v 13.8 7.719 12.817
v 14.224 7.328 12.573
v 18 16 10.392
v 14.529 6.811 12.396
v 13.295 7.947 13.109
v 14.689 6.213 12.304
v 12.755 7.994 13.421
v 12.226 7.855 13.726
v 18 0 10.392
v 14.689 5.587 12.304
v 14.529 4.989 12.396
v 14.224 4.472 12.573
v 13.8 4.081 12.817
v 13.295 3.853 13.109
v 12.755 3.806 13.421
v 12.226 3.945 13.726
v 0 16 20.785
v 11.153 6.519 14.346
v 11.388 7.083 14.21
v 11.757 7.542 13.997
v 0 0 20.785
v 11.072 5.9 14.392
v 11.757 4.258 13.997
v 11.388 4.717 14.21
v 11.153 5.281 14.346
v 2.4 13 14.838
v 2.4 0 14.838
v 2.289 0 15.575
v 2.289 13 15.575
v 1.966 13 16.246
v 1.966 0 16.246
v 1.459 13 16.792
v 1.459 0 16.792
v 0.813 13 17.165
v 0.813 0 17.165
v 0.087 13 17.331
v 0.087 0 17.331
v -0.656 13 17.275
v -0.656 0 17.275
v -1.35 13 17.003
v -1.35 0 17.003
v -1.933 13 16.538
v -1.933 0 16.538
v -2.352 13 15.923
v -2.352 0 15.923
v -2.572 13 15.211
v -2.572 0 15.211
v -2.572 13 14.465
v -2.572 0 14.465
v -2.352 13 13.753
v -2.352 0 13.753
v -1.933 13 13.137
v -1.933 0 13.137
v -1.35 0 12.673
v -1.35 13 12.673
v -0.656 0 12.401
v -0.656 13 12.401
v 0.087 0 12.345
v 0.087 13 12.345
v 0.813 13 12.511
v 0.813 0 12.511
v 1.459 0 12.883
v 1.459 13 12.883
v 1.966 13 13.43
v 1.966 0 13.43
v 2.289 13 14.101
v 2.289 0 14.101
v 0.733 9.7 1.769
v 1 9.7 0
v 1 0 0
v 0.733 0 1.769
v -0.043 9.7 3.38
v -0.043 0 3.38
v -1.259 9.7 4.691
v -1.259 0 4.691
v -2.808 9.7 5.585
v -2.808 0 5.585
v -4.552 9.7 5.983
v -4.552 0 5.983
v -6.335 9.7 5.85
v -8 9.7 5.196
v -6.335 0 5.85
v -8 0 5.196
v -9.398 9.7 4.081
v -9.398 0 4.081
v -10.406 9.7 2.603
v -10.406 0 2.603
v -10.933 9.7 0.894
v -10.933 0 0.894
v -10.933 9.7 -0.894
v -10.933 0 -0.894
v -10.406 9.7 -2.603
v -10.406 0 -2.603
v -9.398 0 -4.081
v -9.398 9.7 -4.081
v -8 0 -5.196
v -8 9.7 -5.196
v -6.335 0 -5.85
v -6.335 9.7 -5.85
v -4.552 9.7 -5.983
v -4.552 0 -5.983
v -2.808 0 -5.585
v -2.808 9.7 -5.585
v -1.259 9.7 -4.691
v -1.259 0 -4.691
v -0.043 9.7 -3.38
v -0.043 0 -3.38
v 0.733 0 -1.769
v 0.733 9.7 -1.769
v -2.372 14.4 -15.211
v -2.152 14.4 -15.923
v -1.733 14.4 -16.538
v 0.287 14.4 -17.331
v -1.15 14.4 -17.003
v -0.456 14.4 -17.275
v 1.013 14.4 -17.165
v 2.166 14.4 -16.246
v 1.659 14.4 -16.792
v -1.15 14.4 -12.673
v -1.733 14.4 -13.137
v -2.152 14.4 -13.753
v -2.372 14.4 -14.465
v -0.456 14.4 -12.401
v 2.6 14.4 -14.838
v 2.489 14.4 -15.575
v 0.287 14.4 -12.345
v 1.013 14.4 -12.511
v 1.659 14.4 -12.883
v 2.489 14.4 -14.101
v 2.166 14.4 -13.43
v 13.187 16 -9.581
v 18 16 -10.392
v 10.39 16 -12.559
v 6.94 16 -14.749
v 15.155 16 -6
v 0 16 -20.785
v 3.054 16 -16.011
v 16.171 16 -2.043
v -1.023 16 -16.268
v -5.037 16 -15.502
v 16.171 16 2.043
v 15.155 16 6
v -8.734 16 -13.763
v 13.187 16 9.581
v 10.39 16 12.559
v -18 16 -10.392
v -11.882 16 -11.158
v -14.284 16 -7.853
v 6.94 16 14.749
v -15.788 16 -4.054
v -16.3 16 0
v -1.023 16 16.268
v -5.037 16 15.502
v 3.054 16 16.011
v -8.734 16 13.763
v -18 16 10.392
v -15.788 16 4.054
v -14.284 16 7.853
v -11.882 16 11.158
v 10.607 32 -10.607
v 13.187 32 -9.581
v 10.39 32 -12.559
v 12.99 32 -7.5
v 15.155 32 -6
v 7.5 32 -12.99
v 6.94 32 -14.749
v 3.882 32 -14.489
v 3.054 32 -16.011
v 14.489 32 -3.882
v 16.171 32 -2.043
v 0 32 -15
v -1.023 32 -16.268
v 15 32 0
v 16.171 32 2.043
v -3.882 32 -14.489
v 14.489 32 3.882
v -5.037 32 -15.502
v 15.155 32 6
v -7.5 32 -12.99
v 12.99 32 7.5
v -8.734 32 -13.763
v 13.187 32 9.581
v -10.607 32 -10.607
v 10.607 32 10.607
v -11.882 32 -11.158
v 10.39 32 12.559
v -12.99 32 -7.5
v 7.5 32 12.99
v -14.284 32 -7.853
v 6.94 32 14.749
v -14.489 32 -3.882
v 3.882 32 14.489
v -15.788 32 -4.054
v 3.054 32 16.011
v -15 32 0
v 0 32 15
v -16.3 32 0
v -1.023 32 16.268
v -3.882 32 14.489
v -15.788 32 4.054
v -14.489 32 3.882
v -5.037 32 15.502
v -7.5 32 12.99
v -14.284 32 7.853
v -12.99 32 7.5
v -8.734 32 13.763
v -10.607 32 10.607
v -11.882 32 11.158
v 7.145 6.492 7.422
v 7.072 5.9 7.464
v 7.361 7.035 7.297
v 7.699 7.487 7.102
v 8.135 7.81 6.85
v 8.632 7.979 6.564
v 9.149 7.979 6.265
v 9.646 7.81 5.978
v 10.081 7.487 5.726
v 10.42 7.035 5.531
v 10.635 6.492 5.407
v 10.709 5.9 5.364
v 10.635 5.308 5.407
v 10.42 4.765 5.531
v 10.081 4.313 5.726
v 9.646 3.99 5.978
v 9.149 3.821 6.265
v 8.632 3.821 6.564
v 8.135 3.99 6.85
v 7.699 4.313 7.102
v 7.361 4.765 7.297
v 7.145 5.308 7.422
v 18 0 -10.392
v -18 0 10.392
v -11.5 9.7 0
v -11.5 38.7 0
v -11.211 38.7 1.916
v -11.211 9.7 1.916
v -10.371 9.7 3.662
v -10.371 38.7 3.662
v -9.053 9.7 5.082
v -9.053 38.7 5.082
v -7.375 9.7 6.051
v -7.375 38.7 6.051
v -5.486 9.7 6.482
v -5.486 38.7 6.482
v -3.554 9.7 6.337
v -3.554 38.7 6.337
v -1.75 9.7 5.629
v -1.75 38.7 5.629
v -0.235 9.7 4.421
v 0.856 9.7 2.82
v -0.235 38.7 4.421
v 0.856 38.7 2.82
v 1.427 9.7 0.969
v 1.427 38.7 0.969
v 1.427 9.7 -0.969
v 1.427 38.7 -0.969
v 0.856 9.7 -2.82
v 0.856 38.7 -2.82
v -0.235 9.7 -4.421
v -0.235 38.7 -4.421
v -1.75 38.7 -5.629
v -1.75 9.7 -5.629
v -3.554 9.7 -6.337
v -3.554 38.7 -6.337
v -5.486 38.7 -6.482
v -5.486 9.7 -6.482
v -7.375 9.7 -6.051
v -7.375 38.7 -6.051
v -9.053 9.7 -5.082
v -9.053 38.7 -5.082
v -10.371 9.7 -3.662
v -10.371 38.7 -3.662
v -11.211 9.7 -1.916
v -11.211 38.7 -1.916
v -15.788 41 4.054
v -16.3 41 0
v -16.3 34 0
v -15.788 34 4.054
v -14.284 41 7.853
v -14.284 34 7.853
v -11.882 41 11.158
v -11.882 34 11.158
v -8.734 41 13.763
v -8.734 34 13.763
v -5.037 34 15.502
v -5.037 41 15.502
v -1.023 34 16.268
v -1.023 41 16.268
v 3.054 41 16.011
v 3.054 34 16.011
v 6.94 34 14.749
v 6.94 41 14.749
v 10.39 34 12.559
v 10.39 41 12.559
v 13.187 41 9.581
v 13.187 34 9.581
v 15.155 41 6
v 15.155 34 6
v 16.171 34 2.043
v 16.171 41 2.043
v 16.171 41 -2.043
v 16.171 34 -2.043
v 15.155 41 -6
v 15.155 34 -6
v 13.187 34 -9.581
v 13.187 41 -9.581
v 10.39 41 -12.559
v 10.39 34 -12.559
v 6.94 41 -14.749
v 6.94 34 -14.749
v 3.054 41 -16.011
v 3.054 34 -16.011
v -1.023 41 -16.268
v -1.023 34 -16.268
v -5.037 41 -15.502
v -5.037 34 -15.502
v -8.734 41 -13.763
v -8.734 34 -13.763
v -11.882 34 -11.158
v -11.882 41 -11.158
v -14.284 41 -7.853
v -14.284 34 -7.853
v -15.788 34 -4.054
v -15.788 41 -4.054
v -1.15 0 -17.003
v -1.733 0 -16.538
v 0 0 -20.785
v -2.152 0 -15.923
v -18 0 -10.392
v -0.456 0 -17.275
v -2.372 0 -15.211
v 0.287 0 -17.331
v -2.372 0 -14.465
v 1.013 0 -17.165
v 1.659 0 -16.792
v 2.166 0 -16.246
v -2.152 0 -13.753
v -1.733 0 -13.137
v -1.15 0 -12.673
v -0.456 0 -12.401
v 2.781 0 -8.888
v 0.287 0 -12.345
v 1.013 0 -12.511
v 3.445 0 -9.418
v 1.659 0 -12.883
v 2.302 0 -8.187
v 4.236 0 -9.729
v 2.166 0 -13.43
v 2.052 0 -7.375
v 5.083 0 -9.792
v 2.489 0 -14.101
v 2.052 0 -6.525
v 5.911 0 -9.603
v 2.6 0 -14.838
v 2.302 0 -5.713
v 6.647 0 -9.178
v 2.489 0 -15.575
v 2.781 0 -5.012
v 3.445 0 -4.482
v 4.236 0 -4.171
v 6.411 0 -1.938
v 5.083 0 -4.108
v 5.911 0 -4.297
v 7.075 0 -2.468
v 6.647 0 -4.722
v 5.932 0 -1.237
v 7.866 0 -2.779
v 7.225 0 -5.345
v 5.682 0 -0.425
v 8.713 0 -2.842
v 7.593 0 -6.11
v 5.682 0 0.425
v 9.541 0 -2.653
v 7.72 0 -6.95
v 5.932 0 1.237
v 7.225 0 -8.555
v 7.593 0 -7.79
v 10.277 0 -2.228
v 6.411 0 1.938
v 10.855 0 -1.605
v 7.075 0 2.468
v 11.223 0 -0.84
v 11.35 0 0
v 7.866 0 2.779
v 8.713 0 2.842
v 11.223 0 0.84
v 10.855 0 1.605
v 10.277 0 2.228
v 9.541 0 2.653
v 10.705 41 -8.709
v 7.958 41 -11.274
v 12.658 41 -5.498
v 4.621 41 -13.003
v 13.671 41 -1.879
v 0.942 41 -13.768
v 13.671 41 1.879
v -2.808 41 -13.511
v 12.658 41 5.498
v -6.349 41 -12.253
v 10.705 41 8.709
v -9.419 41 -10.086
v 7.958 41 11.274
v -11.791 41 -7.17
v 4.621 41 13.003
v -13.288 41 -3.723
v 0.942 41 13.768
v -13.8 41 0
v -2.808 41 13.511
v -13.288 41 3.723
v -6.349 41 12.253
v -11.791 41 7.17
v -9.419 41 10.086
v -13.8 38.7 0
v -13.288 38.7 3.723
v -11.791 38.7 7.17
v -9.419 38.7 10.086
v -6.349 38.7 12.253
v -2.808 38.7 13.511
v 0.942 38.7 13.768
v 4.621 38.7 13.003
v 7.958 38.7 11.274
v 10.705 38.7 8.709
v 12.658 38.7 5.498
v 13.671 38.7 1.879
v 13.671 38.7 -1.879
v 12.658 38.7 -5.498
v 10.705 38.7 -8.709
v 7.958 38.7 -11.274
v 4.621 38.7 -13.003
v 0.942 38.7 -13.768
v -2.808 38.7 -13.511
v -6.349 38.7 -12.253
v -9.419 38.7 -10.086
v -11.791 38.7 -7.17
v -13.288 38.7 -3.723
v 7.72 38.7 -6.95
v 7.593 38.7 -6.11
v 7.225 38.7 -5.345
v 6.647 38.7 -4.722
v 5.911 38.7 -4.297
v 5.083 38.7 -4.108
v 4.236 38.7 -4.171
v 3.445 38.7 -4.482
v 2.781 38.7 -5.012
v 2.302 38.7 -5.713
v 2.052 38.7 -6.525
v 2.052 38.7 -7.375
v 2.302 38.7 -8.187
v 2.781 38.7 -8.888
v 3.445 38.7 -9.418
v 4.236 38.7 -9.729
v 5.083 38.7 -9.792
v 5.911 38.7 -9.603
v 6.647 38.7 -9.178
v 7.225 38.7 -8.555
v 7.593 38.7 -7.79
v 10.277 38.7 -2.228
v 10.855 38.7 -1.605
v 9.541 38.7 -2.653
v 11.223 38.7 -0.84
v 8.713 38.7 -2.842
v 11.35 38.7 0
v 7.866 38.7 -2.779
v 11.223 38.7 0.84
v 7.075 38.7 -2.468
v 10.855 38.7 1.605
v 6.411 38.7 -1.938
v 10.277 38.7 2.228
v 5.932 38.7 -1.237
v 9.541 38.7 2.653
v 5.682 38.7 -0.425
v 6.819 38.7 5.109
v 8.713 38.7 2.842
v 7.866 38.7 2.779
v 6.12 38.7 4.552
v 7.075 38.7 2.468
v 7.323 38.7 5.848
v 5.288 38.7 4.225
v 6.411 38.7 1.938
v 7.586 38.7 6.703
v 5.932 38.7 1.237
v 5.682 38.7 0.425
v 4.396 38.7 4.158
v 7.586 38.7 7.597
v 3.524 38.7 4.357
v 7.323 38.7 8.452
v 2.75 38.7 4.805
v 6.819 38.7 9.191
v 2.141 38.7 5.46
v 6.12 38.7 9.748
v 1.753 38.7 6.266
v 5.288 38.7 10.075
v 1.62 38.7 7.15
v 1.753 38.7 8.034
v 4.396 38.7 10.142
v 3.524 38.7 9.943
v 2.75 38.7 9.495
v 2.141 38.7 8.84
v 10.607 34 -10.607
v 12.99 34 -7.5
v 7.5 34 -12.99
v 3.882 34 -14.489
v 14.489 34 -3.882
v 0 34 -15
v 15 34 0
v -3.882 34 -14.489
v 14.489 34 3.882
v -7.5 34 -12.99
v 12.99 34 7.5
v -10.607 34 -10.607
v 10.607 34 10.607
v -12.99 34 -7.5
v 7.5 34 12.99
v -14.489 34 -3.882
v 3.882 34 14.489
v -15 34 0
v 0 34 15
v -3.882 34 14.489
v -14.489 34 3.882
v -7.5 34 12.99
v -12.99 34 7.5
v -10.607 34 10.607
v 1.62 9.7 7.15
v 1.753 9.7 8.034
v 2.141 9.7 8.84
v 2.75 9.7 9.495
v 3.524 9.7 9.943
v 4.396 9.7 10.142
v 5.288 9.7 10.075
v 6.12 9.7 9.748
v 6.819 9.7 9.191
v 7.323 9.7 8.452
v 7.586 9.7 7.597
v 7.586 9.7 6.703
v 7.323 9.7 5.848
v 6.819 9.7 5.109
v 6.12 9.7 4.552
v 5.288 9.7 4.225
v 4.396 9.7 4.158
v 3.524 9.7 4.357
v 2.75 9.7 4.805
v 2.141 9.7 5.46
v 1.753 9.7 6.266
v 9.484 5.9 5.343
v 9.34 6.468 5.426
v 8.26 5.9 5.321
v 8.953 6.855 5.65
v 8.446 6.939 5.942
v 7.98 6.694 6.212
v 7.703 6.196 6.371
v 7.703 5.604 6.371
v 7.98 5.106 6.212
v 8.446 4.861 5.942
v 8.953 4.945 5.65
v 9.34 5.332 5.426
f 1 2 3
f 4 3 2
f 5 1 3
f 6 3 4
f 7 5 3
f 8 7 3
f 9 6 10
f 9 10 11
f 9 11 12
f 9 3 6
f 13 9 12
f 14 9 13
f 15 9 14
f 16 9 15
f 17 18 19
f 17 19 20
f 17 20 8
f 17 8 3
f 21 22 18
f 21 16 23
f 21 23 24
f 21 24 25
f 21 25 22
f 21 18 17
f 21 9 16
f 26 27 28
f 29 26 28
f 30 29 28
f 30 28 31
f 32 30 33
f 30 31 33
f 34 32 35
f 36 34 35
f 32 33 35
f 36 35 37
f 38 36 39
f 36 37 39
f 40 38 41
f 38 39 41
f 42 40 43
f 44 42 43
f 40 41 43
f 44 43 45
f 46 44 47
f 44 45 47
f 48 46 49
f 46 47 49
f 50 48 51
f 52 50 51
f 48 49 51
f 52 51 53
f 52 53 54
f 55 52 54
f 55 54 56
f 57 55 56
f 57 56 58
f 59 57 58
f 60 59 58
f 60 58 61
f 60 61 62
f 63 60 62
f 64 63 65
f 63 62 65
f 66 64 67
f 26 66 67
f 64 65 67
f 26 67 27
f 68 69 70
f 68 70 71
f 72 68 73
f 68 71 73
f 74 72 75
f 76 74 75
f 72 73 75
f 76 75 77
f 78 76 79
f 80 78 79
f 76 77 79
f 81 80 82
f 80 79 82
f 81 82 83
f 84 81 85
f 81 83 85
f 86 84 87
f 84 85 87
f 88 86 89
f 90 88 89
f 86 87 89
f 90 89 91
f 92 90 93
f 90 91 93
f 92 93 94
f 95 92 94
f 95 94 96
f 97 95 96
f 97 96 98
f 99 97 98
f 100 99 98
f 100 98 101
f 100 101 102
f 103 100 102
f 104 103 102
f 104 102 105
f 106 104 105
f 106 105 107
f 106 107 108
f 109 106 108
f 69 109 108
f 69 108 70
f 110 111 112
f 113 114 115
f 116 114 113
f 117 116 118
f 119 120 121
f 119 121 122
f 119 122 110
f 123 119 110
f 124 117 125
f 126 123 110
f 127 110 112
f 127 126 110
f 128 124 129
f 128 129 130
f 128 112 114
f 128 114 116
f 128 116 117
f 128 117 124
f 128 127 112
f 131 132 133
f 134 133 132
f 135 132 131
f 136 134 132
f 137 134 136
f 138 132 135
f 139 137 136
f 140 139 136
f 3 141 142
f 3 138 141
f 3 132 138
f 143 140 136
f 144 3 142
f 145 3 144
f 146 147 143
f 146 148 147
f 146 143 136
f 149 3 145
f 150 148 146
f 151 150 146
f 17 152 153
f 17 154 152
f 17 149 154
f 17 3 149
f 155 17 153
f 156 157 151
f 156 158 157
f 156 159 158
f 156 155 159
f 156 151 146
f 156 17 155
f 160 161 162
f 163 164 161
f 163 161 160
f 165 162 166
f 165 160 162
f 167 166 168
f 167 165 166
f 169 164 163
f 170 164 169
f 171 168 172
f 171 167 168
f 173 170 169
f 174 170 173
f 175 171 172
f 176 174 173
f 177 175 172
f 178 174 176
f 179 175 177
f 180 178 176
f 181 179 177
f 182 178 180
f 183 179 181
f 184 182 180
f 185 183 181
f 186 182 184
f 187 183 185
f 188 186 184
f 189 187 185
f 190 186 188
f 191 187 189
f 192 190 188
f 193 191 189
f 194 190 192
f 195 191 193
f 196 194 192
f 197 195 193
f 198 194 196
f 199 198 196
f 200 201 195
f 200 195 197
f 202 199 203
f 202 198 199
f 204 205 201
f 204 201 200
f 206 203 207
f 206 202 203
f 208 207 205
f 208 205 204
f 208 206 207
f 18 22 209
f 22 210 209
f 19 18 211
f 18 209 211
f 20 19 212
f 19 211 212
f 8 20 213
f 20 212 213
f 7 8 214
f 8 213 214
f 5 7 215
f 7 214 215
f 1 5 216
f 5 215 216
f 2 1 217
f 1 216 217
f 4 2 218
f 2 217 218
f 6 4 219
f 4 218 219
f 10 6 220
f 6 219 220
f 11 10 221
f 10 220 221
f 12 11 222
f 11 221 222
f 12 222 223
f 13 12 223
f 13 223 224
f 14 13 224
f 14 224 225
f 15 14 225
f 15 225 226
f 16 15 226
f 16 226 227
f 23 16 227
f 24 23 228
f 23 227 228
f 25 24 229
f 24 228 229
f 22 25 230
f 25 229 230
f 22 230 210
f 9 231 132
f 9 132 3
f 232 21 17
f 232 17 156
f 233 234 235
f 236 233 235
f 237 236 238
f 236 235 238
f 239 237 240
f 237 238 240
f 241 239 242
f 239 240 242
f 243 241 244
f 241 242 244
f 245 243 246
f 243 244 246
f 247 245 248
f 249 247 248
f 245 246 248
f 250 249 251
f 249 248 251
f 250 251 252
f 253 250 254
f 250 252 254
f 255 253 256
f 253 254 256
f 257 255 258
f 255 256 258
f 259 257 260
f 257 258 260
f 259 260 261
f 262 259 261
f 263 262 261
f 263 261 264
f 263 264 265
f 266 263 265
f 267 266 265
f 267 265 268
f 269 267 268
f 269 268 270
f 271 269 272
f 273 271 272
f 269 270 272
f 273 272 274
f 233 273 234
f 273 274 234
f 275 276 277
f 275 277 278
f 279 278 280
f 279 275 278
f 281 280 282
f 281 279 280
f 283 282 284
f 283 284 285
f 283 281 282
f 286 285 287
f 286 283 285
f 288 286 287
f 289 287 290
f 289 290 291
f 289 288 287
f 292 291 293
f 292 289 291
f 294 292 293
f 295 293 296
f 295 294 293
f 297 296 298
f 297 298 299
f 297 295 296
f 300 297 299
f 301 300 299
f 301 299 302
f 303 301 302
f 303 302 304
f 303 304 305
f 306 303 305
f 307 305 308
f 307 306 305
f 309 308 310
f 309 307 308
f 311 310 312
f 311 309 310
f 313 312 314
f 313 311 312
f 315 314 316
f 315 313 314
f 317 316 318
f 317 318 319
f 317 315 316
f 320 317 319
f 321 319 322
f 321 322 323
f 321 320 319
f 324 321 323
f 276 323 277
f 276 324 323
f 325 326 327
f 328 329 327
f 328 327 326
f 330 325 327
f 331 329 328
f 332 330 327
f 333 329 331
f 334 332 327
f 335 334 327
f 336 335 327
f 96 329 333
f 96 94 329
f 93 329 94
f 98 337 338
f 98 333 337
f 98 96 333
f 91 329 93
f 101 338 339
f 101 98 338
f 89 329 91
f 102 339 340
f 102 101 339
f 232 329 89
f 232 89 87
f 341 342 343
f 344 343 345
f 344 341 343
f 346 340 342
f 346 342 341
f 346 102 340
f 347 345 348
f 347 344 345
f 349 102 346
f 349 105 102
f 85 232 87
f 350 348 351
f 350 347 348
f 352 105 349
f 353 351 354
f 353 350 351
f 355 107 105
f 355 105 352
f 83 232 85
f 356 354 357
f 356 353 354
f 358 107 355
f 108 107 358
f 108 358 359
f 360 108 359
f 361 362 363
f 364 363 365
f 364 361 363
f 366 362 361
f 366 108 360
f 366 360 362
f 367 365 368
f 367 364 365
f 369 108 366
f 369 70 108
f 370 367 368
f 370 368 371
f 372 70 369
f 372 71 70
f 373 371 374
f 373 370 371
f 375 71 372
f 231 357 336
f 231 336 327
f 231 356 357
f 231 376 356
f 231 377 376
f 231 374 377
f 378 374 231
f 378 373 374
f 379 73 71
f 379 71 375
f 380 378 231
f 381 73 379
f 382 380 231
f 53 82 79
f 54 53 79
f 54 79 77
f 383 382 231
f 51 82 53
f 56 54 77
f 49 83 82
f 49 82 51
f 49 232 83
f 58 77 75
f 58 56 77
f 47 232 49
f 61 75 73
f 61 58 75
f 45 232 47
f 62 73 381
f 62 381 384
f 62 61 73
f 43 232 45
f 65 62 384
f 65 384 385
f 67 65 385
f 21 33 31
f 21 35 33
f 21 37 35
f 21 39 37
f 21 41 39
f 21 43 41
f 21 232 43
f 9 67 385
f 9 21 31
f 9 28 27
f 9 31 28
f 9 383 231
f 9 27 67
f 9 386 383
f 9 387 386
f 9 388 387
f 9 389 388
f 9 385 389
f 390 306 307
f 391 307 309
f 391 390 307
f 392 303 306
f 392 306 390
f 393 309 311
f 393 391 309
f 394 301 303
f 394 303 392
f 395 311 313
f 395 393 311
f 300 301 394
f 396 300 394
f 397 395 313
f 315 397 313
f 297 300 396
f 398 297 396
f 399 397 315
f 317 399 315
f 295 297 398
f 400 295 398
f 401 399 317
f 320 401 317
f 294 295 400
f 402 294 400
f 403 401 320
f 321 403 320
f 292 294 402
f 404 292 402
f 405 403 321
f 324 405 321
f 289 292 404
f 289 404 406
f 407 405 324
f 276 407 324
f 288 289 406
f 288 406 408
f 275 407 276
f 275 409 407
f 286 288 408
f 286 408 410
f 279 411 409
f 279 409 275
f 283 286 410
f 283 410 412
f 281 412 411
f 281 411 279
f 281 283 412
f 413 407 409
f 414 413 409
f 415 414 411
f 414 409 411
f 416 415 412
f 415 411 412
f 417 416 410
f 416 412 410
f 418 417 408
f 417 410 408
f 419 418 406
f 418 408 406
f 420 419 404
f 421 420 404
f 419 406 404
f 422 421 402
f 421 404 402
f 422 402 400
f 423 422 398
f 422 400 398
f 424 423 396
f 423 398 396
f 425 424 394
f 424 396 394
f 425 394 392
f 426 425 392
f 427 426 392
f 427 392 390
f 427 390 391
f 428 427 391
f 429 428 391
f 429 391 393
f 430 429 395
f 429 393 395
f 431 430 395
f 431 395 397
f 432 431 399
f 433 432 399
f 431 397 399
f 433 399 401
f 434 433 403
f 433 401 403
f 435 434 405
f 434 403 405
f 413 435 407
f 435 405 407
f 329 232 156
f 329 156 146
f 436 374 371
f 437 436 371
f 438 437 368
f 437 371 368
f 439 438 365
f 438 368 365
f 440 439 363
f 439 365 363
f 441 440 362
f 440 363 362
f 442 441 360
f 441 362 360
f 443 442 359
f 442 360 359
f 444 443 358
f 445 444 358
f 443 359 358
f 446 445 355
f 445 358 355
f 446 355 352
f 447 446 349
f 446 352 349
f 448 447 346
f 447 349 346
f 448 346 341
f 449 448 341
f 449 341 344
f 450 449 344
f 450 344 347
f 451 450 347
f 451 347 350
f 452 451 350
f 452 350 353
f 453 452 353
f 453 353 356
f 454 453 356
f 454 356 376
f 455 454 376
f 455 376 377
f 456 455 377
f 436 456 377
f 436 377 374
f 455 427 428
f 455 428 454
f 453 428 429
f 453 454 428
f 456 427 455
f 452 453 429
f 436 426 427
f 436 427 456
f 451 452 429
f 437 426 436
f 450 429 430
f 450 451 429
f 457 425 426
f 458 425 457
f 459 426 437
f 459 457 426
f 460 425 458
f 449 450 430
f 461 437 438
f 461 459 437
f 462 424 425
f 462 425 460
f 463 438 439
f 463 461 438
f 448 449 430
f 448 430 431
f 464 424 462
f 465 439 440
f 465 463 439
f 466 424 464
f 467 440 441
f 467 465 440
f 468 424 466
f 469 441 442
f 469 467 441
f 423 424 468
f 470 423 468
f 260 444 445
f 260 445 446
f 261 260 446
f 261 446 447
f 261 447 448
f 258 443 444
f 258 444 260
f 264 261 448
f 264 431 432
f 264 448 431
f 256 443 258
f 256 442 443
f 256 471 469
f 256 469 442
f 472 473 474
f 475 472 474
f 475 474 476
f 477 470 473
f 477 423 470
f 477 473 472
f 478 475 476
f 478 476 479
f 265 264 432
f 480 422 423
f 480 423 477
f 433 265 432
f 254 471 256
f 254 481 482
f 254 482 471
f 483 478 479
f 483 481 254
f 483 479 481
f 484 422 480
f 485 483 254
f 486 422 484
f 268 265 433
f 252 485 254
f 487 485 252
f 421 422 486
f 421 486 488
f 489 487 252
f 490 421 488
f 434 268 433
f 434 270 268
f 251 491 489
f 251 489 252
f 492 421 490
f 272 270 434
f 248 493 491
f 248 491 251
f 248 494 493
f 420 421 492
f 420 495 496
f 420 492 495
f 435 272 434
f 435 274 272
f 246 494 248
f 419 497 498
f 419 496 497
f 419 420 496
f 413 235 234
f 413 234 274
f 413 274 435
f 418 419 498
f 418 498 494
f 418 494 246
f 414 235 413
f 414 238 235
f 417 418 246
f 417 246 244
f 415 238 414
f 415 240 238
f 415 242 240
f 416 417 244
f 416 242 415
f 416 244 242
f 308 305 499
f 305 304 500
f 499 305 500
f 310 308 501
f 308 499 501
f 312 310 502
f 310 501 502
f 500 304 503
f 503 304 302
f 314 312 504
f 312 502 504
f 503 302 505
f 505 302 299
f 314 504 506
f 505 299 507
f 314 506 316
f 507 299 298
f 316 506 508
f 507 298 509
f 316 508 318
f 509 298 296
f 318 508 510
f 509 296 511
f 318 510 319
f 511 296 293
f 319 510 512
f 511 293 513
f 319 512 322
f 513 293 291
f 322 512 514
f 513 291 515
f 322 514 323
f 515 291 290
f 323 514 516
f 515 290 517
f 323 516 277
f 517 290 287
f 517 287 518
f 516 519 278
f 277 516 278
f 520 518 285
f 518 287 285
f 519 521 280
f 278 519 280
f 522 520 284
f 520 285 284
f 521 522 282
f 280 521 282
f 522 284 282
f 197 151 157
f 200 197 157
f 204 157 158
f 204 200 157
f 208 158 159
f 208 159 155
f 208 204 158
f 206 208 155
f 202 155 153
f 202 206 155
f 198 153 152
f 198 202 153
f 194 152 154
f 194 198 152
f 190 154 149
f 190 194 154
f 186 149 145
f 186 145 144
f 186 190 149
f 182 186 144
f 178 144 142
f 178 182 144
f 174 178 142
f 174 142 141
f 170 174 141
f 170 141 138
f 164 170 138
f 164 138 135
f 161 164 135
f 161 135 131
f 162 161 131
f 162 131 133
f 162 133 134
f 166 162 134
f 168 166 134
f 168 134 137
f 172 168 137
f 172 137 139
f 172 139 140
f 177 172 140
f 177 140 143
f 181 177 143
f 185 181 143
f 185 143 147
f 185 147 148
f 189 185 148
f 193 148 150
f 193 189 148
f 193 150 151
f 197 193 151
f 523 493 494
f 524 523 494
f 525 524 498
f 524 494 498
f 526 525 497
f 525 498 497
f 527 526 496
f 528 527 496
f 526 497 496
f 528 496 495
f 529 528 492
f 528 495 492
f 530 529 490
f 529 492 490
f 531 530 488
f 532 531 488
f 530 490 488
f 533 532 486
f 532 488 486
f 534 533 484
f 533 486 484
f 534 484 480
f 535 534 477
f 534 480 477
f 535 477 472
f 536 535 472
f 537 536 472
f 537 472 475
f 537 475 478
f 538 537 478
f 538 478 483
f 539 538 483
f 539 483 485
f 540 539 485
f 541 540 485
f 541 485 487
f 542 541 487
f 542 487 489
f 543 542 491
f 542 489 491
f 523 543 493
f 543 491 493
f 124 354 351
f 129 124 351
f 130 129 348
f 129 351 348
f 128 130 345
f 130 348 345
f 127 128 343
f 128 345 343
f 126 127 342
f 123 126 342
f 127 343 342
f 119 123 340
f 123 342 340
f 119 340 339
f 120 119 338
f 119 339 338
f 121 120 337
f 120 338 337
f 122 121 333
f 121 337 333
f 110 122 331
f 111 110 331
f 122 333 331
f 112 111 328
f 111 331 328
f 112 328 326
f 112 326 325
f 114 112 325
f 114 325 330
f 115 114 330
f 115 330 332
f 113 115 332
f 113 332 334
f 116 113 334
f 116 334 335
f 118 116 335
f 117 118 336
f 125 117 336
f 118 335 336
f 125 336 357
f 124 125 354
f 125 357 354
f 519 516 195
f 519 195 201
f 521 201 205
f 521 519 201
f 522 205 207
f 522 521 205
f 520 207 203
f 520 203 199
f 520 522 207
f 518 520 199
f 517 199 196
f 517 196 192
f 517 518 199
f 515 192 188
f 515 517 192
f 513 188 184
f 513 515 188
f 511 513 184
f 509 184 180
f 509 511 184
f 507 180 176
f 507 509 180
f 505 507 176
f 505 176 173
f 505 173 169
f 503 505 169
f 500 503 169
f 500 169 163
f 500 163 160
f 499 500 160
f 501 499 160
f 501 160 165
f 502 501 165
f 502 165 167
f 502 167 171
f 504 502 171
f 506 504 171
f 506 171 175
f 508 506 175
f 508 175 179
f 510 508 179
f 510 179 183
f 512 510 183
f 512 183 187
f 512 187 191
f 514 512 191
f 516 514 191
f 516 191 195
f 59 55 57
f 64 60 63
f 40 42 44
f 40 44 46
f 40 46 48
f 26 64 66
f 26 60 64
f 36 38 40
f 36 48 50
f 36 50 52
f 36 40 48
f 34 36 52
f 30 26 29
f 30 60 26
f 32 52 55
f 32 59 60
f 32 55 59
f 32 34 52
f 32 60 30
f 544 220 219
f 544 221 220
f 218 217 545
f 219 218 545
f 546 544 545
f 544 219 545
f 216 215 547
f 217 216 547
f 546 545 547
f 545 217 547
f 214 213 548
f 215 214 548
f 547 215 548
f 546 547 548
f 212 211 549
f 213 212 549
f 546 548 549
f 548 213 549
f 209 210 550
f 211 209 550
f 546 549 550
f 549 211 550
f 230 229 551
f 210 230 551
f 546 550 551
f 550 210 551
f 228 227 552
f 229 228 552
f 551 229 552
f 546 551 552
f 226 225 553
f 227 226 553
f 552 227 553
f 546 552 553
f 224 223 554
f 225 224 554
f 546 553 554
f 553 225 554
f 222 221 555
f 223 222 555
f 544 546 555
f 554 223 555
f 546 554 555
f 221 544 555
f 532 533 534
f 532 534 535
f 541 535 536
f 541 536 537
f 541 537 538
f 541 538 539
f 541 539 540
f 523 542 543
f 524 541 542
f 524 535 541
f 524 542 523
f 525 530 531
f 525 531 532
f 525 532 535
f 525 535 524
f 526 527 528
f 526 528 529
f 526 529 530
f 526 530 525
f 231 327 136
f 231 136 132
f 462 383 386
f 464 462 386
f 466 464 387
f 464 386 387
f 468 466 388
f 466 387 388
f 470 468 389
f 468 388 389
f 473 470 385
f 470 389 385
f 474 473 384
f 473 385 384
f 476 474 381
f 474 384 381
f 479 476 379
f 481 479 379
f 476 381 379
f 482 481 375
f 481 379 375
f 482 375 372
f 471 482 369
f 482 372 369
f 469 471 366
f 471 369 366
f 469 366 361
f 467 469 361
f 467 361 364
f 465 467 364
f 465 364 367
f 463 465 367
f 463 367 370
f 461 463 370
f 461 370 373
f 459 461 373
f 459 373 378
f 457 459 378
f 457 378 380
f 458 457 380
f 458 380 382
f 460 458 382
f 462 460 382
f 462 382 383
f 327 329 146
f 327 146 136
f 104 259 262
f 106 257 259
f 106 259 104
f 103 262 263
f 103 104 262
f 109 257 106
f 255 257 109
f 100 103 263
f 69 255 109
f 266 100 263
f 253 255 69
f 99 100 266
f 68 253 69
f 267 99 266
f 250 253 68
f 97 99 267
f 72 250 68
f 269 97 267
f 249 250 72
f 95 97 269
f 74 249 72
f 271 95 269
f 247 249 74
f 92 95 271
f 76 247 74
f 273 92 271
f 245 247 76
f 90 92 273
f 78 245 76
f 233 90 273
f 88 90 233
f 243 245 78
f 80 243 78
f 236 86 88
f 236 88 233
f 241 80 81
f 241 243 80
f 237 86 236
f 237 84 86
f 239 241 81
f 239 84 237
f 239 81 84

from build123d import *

# Parameters (mm, degrees)
F1_DEPTH  = 41
F2_R      = 24.4692351537
F2_R_2    = 16.3
F3_DEPTH  = 25
F4_R      = 21.9531203574
F4_R_2    = 15
F5_DEPTH  = 9
F6_R      = 16.3
F7_DEPTH  = 7
F8_R      = 2.85
F9_DEPTH  = 41.001
F10_R     = 13.8
F11_DEPTH = 2.3
F12_R     = 6
F13_DEPTH = 41.001
F14_R     = 6.5
F15_DEPTH = 29
F16_R     = 2.5
F17_DEPTH = 13
F18_R     = 2.5
F19_DEPTH = 14.4
F21_D     = 4.2
F21_DEPTH = 8
F21_TIP   = 1.2618073
F22_R     = 3
F23_DEPTH = 29


with BuildPart() as f1:
    # F0 (on Front) → F1 (new body)
    with BuildSketch(Plane.XZ):
        Polygon((-18, -10.3923048454), (0, -20.7846096908), (18, -10.3923048454), (18, 10.3923048454), (0, 20.7846096908), (-18, 10.3923048454), align=None)
    extrude(amount=-F1_DEPTH)

    # F2 (on face) → F3 (cut)
    with BuildSketch(Plane(origin=(0, 41, 0), x_dir=(-1, 0, 0), z_dir=(0, 1, 0))):
        Circle(F2_R)
        Circle(F2_R_2, mode=Mode.SUBTRACT)
    extrude(amount=-F3_DEPTH, mode=Mode.SUBTRACT)

    # F4 (on face) → F5 (cut)
    with BuildSketch(Plane(origin=(0, 41, 0), x_dir=(-1, 0, 0), z_dir=(0, 1, 0))):
        Circle(F4_R)
        Circle(F4_R_2, mode=Mode.SUBTRACT)
    extrude(amount=-F5_DEPTH, mode=Mode.SUBTRACT)

    # F6 (on face) → F7 (join)
    with BuildSketch(Plane(origin=(0, 41, 0), x_dir=(-1, 0, 0), z_dir=(0, 1, 0))):
        Circle(F6_R)
    extrude(amount=-F7_DEPTH)

    # F8 (on face) → F9 (cut, through all)
    with BuildSketch(Plane.XZ):
        with Locations((8.5, 0)):
            Circle(F8_R)
        with Locations((4.87, -6.95)):
            Circle(F8_R)
    extrude(amount=-F9_DEPTH, mode=Mode.SUBTRACT)

    # F10 (on face) → F11 (cut)
    with BuildSketch(Plane(origin=(0, 41, 0), x_dir=(-1, 0, 0), z_dir=(0, 1, 0))):
        Circle(F10_R)
    extrude(amount=-F11_DEPTH, mode=Mode.SUBTRACT)

    # F12 (on face) → F13 (cut, through all)
    with BuildSketch(Plane.XZ):
        with Locations((-5, 0)):
            Circle(F12_R)
    extrude(amount=-F13_DEPTH, mode=Mode.SUBTRACT)

    # F14 (on face) → F15 (cut)
    with BuildSketch(Plane(origin=(0, 38.7, 0), x_dir=(-1, 0, 0), z_dir=(0, 1, 0))):
        with Locations((5, 0)):
            Circle(F14_R)
    extrude(amount=-F15_DEPTH, mode=Mode.SUBTRACT)

    # F16 (on face) → F17 (cut)
    with BuildSketch(Plane.XZ):
        with Locations((-0.1, 14.8379019182)):
            Circle(F16_R)
    extrude(amount=-F17_DEPTH, mode=Mode.SUBTRACT)

    # F18 (on face) → F19 (cut)
    with BuildSketch(Plane.XZ):
        with Locations((0.1, -14.8379019182)):
            Circle(F18_R)
    extrude(amount=-F19_DEPTH, mode=Mode.SUBTRACT)

    # F21
    with Locations(Plane(origin=(9, 0, 15.5884572681), x_dir=(0.8660254038, 0, -0.5), z_dir=(0.5, 0, 0.8660254038))):
        with Locations((4.4923048454, 5.9)):
            Hole(F21_D / 2, depth=F21_DEPTH)
            with Locations((0, 0, -(F21_DEPTH + F21_TIP / 2))):  # 118° drill point
                Cone(0, F21_D / 2, F21_TIP, mode=Mode.SUBTRACT)

    # F22 (on face) → F23 (cut)
    with BuildSketch(Plane(origin=(0, 38.7, 0), x_dir=(-1, 0, 0), z_dir=(0, 1, 0))):
        with Locations((-4.62, 7.15)):
            Circle(F22_R)
    extrude(amount=-F23_DEPTH, mode=Mode.SUBTRACT)


solid = f1.part
